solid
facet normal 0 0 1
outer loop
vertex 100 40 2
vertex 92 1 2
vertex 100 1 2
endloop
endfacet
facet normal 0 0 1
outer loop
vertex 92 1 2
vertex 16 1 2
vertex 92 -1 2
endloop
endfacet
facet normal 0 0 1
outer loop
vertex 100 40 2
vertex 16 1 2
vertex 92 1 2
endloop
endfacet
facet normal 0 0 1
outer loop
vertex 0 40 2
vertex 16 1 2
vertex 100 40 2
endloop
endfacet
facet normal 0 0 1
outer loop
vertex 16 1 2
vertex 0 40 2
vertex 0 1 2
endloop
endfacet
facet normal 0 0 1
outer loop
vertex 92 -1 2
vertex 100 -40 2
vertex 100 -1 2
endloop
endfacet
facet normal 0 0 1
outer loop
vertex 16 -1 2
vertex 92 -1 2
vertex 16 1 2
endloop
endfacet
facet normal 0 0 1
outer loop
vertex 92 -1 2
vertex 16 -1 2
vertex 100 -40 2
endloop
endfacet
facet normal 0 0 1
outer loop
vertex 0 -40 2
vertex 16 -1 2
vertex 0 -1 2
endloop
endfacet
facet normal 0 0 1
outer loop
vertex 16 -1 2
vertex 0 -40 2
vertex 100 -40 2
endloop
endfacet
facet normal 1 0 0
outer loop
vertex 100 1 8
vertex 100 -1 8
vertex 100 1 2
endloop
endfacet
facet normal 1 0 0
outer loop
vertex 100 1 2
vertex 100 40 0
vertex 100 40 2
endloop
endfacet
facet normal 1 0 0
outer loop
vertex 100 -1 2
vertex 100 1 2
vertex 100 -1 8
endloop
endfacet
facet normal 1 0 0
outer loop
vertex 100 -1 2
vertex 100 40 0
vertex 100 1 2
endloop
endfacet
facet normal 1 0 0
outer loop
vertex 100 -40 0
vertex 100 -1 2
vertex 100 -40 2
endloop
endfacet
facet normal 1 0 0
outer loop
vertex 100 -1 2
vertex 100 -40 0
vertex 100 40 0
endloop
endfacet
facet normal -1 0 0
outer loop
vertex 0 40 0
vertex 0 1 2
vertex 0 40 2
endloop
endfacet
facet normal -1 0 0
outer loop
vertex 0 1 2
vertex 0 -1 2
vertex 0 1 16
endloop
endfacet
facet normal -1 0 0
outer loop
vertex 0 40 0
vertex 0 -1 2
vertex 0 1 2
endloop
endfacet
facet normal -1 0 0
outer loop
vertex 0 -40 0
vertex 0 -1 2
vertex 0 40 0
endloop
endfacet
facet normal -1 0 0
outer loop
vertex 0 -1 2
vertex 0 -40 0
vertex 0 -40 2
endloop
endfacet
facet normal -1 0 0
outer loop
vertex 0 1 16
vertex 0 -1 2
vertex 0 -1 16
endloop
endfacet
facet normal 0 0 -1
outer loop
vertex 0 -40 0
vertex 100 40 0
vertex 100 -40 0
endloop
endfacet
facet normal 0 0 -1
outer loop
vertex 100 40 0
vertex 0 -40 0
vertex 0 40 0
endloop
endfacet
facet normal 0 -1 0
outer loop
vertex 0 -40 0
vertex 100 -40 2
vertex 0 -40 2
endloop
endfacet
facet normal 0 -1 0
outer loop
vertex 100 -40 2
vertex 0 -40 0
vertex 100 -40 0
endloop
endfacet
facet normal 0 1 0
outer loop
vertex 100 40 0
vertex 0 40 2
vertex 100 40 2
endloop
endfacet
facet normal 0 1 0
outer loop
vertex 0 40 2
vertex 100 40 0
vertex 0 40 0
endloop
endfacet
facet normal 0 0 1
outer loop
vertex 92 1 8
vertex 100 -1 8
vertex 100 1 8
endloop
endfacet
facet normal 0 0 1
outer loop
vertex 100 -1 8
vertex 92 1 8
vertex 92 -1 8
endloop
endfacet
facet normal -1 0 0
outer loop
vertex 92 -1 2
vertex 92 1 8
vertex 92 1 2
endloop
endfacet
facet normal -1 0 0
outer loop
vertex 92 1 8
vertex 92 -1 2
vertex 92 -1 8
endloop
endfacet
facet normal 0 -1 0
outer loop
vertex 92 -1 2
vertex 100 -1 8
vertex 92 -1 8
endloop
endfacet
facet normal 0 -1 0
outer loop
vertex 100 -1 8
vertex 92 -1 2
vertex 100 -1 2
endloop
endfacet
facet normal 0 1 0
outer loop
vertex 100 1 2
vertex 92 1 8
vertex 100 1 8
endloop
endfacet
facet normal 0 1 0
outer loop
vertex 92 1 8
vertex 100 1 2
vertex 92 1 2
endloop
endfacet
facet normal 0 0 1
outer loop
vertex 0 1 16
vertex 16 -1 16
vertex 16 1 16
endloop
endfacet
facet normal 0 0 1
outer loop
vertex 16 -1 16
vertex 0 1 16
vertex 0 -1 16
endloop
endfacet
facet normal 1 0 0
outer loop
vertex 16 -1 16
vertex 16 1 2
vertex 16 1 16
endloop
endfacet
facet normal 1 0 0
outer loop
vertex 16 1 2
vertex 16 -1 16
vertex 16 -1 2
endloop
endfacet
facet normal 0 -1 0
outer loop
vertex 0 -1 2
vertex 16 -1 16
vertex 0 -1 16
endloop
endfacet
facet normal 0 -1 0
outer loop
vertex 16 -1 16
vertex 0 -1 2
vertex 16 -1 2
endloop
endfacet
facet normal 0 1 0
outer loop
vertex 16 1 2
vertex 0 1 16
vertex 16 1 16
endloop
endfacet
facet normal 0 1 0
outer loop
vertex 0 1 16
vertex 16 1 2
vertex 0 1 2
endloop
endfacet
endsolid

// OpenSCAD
$fn=30;
ts=2;


ugol=[10+0.5+1,15+0.5+1,2+0.4];//размеры уголка высота/ширина/толщина
pole=[80,80,ts];// [20,30,ts];;//размеры поля
stk=[ts,10,6*ts];//размеры стойки 
stl=[ts*3+stk.x, ts*3+stk.y, stk.z];//размеры столба

fp=[stk.x-0.2,stk.y-0.4,ugol.y];//форма прижимной пласитны 

hz=10;
hx=4.5;
dlh=10;
hh=100;


plt=42;
pin=[9, 5*9+1.5, 12];
botr=8;
prk=[20,15,pin.z*2];

//all();
//translate([-pole.x/2,pole.y+ts*3,0])test00();
//translate([pole.x/2+30,(pole.y+ts*3),0]) test00();

test00();

module all(){
    //translate([pole.x/2-ts*2,0,4*ts])cube([stl.x,ts+0.6, 6*ts],true);
    difference(){
        union(){
            translate([0,0,ts/2])cube(pole,true);
            //translate([plt/2-pin.x,0,ts+botr/2])cube([pin.x+ts,pin.y+ts,botr],true);
            translate([pole.x/2,0,6*ts/2])cube([3*ts,pole.y, 6*ts],true);
            translate([-pole.x/2,0,6*ts/2])cube([3*ts,pole.y, 6*ts],true);
        }
        //translate([pole.x/2,0,4*ts])cube([stl.x*2+ts,ts+0.6, 6*ts],true);
        translate([pole.x/2-ts*2,0,4*ts])cube([stl.x,ts+0.6, 6*ts],true);
        translate([-pole.x/2+ts*2,0,4*ts])cube([stl.x,ts+0.6, 6*ts],true);
        
        translate([pole.x/2,0,ts*4])cube([ts+0.6,pole.y+ts, ts*6],true);
        translate([-pole.x/2,0,ts*4])cube([ts+0.6,pole.y+ts, ts*6],true);
        //translate([plt/2-pin.x,0,ts+pin.z/2])cube(pin,true);
        //translate([plt/2-pin.x,-2.5*5,0])cube(prk,true);
    }
}


//translate([0,0,ts/2])cube(pole,true);

module test00(){
    rotate([0,90,0])translate([-stl.x/2,0,0]){
        rotate([0,0,180])//difference(){
            union(){
                //translate([0,0,(fp.z+5*ts)/2])cube([ stl.x,ugol.y+2*ts, fp.z+5*ts],true);
                translate([ts/2-stl.x/2,0,hh/2])cube([ ts,pole.y, hh],true);
                translate([stl.x/2-stl.x/2,0,-stl.x/2+hh])cube([ stl.x,ts, stl.x],true);
                translate([stl.x/2,0,stl.x])cube([ stl.x*2,ts, stl.x*2],true);
            }
            //translate([0,0,(fp.z-5*ts)])ug();
        //}
       // translate([0,0,ts])cube([ stl.x, pole.y, ts*2],true);
    }
}


module test01(){
    rotate([0,90,0])translate([-stl.x/2,0,0]){
        rotate([0,0,180])difference(){
            union(){
                translate([0,0,(fp.z+5*ts)/2])cube([ stl.x,ugol.y+2*ts, fp.z+5*ts],true);
                translate([ts/2-stl.x/2,0,hh/2])cube([ ts,pole.y, hh],true);
                translate([stl.x/2-stl.x/2,0,-stl.x/2+hh])cube([ stl.x,ts, stl.x],true);
            }
            translate([0,0,(fp.z-5*ts)])rotate([0,0,180])ug();
        }
        translate([0,0,ts])cube([ stl.x, pole.y, ts*2],true);
    }
}



module ug(){
    translate([0,ugol.y/2-ugol.z/2,ugol.x/2+ts*3])cube([pole.x*2,ts,ugol.x],true);
    translate([0,0,ugol.x/2+ts*3+ugol.x/2-ugol.z/2])cube([pole.x*2+4*ts,ugol.y,ts],true);
    translate([0,ugol.y/2-ugol.z/2-ts+0.1,ugol.x/2+ts*2+ugol.x/2-ugol.z/2+0.1])cube([pole.x*2+4*ts,ts,ts],true);
}
